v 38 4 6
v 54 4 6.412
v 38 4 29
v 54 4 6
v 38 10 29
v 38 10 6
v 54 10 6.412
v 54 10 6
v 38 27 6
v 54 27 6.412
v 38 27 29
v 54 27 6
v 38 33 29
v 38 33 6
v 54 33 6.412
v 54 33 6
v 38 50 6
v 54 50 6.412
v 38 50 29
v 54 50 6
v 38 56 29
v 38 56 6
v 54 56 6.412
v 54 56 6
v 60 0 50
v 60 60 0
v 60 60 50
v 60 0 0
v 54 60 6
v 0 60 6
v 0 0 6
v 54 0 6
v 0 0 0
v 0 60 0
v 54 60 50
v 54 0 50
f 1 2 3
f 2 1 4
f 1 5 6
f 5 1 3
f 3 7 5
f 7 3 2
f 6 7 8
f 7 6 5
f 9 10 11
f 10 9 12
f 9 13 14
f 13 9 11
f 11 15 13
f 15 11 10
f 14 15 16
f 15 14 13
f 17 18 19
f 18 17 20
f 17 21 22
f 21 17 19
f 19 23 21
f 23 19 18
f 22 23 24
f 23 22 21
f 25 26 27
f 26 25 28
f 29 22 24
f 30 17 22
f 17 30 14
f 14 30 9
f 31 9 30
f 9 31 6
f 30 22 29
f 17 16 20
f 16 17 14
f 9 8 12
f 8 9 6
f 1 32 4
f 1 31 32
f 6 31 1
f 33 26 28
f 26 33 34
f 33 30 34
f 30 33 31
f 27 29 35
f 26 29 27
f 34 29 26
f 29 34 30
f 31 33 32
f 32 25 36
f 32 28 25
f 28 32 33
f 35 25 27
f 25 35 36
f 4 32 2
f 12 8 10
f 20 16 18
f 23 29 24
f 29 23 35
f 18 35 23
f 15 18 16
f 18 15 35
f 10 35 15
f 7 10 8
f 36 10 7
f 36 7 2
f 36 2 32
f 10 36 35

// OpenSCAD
$fn = 32;

// ----------------------------------------------------------------------
// Rib bracket: 3-gusset L bracket
// ----------------------------------------------------------------------

// --- parameters (mm) ---
base_l = 60;              // foot length, X
base_w = 60;              // foot width, Y
base_t = 6;               // foot thickness
plate_t = 6;              // upright plate thickness
plate_h = 50;             // overall height
gus_l = 16;               // gusset leg along the foot
gus_h = 24;               // gusset height
gus_t = 6;                // gusset thickness
gus_edge = 4;             // gusset margin from the foot edge
n_gus = 3;                // gusset count

gus_pitch = (base_w - 2 * gus_edge - gus_t) / (n_gus - 1);  // gusset pitch

union() {
  cube([base_l, base_w, base_t]);
  translate([base_l - plate_t, 0, base_t - 1])
    cube([plate_t, base_w, plate_h - base_t + 1]);
  for (i = [0 : n_gus - 1])
    translate([base_l - plate_t - gus_l, gus_edge + i * gus_pitch, base_t - 1])
      rotate([-90, 0, 0])
        linear_extrude(height = gus_t)
          polygon(points = [[0, 0], [gus_l + 1, 0], [0, -gus_h]]);
}
